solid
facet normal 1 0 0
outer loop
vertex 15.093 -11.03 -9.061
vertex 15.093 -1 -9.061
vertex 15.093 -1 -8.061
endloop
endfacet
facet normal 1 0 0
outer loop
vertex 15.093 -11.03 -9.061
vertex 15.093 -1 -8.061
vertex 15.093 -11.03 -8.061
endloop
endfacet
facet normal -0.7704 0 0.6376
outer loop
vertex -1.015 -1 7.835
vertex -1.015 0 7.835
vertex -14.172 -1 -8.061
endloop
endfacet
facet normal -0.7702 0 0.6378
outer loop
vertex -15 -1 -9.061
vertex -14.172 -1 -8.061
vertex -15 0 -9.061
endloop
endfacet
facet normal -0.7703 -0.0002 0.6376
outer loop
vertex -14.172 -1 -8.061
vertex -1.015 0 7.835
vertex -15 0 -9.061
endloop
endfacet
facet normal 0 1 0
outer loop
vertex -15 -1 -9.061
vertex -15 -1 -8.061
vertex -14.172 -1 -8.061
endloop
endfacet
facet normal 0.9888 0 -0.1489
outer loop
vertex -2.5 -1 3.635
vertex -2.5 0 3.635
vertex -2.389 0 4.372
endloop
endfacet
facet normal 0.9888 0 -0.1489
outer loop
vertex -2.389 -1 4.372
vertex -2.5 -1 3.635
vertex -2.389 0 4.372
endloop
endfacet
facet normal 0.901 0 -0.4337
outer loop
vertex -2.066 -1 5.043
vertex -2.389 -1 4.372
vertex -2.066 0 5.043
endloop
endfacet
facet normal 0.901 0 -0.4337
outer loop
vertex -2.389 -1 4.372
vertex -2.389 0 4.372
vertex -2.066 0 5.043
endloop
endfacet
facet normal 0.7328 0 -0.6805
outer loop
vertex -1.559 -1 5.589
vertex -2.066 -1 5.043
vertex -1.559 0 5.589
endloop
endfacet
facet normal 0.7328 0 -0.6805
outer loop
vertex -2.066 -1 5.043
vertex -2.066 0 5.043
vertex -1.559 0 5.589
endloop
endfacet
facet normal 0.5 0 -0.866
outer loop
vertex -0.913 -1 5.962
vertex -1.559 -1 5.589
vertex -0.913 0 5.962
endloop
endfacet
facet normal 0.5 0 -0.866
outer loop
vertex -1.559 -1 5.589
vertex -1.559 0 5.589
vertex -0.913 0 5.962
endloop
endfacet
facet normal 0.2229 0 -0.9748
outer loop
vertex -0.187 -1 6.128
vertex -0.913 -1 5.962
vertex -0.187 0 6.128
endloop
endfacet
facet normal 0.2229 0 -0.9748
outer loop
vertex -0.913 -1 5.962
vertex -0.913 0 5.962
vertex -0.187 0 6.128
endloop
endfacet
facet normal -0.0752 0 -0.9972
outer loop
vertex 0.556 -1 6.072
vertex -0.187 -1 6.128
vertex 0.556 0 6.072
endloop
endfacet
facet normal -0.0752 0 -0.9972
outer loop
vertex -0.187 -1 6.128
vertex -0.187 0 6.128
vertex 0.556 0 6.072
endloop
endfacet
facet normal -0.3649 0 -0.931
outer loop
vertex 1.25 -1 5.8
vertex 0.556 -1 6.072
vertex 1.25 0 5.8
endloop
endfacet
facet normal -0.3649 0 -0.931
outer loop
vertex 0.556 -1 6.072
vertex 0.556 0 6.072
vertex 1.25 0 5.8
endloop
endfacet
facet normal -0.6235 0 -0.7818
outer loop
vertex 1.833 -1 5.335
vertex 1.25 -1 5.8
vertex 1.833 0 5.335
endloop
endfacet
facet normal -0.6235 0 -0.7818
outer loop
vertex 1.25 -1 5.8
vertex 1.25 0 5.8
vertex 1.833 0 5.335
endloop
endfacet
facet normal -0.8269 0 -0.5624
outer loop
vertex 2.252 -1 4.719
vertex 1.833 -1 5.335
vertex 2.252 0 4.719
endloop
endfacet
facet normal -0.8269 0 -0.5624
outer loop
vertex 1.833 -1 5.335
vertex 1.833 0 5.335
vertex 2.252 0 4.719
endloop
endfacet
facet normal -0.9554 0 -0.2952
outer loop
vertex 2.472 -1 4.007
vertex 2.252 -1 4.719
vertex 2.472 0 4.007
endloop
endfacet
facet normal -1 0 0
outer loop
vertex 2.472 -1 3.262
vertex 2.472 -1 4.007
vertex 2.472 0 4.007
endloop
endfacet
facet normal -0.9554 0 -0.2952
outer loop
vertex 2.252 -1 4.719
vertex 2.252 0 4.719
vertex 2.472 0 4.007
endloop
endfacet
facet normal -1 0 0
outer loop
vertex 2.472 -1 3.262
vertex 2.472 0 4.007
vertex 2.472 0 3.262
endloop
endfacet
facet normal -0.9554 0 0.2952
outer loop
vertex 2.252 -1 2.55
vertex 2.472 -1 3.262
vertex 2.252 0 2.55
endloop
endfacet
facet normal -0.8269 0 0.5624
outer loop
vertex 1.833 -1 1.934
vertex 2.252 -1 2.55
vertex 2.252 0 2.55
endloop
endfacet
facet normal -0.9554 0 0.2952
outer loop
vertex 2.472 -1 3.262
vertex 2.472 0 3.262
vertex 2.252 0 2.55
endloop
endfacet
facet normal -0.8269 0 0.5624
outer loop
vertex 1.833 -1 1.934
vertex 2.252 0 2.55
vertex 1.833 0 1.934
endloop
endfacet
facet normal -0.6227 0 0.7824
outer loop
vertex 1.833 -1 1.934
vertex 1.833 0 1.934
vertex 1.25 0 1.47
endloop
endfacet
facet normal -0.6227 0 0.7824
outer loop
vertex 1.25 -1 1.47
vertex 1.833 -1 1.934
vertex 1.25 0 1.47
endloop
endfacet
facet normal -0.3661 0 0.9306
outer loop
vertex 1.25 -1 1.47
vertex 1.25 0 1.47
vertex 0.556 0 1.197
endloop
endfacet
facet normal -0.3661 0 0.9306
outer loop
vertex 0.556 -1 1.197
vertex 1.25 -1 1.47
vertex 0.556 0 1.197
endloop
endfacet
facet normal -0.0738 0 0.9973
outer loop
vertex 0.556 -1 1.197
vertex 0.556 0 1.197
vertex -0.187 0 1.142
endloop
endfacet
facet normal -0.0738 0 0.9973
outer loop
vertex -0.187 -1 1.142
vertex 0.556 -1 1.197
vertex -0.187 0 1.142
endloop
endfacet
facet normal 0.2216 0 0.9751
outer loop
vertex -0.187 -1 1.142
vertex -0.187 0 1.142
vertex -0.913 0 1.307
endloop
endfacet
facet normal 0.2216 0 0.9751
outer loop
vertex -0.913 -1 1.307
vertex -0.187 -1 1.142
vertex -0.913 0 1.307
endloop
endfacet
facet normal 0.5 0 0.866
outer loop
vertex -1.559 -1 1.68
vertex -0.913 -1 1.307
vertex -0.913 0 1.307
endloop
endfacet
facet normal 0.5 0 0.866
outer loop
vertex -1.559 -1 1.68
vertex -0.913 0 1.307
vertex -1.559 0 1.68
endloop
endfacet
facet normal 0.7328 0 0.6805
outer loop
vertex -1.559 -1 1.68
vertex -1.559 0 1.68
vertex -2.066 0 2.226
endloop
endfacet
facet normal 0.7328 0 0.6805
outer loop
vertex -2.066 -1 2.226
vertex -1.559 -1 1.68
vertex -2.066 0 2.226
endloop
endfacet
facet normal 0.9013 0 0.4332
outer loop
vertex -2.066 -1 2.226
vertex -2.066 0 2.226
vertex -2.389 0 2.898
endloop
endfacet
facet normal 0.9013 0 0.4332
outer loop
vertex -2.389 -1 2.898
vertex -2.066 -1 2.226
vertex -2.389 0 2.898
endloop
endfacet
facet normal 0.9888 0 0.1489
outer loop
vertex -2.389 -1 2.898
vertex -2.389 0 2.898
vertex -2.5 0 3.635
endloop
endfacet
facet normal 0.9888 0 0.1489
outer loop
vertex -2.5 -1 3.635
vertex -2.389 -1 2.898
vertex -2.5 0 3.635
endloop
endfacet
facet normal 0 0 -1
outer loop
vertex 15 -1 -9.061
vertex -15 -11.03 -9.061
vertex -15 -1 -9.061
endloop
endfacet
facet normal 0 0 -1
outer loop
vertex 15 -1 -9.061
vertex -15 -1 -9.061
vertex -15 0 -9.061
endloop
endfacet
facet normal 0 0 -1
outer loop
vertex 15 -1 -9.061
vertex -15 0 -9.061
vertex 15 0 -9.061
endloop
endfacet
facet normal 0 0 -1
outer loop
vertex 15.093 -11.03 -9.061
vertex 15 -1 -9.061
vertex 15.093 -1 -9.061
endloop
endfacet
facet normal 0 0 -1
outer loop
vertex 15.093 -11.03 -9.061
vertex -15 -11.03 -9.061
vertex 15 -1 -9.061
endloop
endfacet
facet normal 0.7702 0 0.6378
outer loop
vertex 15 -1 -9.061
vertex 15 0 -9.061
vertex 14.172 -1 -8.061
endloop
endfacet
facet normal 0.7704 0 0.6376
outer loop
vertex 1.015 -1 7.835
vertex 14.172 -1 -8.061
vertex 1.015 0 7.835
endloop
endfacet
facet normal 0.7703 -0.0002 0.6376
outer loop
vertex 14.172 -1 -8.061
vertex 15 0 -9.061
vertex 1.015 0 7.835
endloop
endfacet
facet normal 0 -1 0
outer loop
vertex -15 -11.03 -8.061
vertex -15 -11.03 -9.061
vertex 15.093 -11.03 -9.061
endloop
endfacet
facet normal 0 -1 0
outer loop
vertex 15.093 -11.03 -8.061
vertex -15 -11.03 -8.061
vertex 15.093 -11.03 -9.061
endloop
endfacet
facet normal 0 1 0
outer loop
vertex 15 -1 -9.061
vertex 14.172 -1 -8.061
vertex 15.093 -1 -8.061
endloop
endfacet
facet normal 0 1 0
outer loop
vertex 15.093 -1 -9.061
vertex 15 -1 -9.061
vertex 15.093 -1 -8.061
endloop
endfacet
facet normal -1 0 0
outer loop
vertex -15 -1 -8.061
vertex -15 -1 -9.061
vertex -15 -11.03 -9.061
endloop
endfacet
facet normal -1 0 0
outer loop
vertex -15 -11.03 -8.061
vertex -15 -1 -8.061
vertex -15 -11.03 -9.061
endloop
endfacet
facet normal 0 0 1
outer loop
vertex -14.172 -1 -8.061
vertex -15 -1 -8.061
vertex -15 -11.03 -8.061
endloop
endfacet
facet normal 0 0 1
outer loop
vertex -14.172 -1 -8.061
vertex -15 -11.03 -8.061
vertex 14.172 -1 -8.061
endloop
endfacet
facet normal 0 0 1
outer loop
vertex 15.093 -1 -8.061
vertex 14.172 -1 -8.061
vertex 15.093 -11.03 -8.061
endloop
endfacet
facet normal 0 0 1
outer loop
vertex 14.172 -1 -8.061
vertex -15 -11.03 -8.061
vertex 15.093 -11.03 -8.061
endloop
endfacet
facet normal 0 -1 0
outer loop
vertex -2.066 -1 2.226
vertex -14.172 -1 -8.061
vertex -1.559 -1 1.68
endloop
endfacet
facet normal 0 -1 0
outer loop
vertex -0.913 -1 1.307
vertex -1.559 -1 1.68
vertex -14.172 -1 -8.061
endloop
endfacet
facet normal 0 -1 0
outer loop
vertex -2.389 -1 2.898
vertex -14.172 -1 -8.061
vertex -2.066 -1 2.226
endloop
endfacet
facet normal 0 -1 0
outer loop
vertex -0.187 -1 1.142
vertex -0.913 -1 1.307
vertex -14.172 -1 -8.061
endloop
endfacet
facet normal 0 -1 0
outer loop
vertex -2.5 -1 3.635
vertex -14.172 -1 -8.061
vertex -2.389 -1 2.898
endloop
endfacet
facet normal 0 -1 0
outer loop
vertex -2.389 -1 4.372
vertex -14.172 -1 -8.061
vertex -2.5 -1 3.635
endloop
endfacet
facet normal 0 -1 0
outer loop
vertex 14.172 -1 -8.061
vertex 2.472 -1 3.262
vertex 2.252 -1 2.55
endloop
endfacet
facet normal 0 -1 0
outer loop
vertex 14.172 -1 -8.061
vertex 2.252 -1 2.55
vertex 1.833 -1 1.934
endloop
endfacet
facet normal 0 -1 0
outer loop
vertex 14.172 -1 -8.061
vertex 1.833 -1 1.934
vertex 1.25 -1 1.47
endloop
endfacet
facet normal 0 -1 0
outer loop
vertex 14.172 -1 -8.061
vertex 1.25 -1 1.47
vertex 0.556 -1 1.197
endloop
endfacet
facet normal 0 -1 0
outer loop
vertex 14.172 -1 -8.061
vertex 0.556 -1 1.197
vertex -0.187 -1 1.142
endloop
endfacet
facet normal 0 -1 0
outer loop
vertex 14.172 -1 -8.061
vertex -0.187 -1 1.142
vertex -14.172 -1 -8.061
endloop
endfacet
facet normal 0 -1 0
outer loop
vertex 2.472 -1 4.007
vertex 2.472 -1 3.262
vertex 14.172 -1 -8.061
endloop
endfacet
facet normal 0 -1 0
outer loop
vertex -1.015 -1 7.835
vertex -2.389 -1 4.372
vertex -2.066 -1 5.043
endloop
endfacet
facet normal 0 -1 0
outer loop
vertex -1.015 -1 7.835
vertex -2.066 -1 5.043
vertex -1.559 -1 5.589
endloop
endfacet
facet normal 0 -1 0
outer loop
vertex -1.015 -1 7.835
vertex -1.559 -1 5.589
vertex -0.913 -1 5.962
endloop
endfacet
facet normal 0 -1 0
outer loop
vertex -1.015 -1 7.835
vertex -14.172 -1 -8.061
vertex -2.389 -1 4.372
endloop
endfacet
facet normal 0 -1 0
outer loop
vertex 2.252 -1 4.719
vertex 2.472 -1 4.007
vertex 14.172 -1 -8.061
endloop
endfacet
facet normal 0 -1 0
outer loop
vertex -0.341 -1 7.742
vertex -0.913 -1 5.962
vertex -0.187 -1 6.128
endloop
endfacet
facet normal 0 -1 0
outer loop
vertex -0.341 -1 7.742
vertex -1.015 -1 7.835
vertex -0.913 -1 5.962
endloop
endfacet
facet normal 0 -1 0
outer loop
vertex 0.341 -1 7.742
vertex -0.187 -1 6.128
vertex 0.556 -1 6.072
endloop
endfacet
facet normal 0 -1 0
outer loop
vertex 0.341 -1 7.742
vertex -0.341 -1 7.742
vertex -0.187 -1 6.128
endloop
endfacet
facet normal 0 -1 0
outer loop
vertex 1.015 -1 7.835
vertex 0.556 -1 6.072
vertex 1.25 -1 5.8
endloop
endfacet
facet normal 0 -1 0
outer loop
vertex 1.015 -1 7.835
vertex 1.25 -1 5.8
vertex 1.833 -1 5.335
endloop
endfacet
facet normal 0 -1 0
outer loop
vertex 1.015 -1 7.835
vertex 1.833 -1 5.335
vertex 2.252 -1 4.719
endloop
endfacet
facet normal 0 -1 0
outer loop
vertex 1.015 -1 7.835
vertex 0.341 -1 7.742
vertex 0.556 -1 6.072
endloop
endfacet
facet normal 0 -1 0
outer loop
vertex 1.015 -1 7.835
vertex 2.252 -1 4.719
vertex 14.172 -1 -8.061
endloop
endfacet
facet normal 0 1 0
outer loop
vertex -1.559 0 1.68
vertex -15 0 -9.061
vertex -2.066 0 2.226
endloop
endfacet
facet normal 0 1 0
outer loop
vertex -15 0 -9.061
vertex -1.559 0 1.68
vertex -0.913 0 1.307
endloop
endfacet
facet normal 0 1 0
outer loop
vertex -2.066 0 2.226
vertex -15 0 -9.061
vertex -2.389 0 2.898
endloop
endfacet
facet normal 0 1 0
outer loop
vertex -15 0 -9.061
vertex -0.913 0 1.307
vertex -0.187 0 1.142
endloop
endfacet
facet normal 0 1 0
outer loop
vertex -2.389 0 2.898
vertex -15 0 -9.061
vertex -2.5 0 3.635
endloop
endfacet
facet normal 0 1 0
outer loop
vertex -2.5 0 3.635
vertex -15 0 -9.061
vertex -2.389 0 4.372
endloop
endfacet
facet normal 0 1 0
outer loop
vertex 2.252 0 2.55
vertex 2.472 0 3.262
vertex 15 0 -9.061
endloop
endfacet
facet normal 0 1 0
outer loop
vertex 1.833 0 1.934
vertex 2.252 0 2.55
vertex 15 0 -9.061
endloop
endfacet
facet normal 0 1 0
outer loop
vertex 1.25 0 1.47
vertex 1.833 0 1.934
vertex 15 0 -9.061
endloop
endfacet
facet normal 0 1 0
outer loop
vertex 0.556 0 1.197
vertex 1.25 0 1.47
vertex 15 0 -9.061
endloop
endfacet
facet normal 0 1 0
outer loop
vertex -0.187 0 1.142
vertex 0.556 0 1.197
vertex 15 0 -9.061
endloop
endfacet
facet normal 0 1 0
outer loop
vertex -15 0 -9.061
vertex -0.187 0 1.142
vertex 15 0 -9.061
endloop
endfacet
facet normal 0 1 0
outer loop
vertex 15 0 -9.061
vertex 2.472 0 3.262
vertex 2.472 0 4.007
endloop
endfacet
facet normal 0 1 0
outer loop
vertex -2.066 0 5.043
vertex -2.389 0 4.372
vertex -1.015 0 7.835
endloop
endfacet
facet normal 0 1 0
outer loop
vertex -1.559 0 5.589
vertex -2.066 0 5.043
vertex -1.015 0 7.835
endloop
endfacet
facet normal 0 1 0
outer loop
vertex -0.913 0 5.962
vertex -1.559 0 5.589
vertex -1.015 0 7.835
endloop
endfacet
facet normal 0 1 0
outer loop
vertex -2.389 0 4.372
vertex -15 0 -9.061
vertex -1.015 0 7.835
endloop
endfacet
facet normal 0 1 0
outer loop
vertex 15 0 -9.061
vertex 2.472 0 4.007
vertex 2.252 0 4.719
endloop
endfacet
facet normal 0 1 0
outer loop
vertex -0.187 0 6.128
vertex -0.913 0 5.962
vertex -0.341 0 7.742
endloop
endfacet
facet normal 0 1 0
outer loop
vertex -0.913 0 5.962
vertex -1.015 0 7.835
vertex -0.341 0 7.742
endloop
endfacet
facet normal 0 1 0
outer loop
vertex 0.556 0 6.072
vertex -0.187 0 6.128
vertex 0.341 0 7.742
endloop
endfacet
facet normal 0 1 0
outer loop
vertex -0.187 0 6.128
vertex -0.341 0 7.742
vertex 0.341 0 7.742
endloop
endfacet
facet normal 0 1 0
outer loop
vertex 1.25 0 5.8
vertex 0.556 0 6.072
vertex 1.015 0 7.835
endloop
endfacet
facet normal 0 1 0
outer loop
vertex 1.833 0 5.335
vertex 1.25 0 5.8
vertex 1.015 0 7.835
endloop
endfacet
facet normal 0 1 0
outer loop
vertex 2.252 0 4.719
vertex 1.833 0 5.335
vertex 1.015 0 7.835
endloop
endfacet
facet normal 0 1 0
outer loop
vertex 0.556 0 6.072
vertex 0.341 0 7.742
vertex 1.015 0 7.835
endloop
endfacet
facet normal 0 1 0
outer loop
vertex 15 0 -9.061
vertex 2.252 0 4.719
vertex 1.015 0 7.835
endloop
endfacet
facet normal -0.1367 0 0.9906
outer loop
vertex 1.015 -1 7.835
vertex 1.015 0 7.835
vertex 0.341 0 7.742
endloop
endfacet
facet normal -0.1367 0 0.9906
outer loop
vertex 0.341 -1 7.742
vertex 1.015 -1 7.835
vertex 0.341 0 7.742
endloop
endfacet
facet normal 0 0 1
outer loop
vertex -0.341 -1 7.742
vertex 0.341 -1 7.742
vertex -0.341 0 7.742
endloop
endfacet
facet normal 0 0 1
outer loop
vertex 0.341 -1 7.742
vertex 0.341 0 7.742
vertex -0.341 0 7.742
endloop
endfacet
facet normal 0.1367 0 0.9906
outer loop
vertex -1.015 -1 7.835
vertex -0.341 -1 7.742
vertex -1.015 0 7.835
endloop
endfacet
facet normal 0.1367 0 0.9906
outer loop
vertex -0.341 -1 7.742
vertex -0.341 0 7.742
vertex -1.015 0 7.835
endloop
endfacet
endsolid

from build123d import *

# Parameters (mm, degrees)
F1_DEPTH = 1
F3_D     = 10
F4_W     = 30.093235299
F4_H     = 10.0299605876
F5_DEPTH = 1
F7_D     = 5


with BuildPart() as f1:
    # F0 (on Front) → F1 (new body)
    with BuildSketch(Plane.XZ):
        Polygon((-15, -9.0614365251), (15, -9.0614365251), (0, 9.0614365251), align=None)
    extrude(amount=F1_DEPTH)

    # F3 (through all)
    with Locations(Plane.XZ.offset(1)):
        with Locations((0, 12.73057051)):
            Hole(F3_D / 2)

    # F4 (on face) → F5 (join)
    with BuildSketch(Plane(origin=(0, 0, -9.0614365251), x_dir=(1, 0, 0), z_dir=(0, 0, -1))):
        with Locations((0.0466176495, 6.0149802938)):
            Rectangle(F4_W, F4_H)
    extrude(amount=-F5_DEPTH)

    # F7 (through all)
    with Locations(Plane.XZ.offset(1)):
        with Locations((0, 3.6346598063)):
            Hole(F7_D / 2)


solid = f1.part
